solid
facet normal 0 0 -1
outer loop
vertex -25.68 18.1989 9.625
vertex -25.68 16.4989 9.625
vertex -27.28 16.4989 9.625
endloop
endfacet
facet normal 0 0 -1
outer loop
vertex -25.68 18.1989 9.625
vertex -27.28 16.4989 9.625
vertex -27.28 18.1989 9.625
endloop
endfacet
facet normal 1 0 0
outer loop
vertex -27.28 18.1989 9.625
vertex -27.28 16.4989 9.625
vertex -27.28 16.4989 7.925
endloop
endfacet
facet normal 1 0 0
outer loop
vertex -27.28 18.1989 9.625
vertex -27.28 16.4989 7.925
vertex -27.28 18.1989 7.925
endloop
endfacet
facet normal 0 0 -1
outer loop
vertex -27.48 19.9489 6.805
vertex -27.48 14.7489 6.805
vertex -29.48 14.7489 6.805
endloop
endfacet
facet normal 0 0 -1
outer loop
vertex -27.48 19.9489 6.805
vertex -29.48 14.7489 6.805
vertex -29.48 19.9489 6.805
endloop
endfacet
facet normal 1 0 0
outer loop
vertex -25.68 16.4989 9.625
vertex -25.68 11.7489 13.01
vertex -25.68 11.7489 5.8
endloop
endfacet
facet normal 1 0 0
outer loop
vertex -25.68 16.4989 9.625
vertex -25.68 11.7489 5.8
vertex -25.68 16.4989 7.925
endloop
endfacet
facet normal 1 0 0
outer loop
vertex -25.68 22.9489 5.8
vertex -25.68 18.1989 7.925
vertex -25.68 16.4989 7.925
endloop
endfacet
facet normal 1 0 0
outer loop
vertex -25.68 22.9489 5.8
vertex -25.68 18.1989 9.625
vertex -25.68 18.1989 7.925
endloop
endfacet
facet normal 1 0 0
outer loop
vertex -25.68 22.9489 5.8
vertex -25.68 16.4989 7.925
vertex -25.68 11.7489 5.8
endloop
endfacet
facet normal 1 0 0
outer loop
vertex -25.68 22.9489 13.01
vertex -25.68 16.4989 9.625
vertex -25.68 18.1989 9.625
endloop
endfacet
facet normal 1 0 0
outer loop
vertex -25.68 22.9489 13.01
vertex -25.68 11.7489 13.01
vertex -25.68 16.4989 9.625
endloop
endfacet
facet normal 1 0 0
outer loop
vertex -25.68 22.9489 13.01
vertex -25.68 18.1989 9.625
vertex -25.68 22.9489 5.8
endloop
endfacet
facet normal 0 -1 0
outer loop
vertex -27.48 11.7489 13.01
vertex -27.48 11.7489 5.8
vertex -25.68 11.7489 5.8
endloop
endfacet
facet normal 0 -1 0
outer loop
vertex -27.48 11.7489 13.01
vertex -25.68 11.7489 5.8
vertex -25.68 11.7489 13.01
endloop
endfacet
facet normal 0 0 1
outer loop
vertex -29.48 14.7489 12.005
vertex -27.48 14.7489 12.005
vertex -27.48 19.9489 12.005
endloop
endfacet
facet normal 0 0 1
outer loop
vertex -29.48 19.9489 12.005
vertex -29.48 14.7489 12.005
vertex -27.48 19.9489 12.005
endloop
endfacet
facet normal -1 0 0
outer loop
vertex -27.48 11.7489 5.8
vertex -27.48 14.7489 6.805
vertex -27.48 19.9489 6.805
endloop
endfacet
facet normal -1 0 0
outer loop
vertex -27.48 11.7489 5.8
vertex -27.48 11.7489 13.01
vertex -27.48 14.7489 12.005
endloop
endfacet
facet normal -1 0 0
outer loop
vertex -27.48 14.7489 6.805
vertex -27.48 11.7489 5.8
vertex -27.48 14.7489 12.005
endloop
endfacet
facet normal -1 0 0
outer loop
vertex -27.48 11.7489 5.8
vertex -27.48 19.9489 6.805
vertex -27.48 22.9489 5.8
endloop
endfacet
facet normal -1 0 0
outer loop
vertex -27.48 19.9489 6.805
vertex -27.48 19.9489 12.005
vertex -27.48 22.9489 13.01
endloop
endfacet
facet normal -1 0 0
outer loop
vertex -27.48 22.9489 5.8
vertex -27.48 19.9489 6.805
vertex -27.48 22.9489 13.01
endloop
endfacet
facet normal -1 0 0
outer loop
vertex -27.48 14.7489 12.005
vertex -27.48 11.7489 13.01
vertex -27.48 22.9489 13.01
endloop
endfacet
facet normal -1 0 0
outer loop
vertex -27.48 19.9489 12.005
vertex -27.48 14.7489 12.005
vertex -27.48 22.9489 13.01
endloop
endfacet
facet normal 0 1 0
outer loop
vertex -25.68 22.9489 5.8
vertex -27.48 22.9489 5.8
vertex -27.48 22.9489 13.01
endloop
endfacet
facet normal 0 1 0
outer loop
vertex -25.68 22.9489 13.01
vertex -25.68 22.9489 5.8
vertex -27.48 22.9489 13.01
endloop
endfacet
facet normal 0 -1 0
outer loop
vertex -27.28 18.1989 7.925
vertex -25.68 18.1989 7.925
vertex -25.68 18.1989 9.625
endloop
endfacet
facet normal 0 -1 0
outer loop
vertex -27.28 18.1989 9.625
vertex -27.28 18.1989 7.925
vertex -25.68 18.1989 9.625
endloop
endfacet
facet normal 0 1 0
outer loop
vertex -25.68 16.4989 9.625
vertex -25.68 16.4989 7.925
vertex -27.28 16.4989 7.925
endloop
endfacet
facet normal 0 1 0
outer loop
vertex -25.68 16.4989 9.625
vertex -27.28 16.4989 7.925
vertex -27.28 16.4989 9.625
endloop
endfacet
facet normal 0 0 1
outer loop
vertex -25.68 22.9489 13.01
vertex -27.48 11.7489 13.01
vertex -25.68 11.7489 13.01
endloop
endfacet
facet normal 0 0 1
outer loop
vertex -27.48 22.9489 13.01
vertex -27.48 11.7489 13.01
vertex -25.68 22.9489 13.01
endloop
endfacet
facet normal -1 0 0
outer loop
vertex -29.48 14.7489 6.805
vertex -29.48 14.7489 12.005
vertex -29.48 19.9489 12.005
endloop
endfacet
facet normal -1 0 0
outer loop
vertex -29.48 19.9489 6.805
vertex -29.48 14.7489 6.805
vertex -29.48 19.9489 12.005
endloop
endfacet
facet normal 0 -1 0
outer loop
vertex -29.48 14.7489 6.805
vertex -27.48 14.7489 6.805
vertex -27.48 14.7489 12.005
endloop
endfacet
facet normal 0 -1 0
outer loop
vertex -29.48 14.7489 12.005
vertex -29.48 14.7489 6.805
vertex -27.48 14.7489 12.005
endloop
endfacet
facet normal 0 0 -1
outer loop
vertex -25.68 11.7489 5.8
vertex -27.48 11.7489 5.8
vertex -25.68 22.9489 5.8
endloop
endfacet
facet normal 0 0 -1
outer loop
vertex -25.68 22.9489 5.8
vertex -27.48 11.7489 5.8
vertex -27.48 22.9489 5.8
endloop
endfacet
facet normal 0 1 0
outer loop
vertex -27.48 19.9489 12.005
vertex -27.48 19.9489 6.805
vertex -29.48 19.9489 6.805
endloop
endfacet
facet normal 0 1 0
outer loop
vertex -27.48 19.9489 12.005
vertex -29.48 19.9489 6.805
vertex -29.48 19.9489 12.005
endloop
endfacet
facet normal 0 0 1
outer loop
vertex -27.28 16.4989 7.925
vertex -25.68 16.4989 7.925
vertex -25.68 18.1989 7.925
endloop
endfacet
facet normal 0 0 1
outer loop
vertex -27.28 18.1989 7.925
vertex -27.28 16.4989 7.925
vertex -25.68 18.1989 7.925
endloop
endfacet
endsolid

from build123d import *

# Parameters (mm, degrees)
SKETCH132_W     = 11.2
SKETCH132_H     = 7.21
PAD065_DEPTH    = 1.8
SKETCH135_W     = 1.7
SKETCH135_H     = 1.7
POCKET058_DEPTH = 1.6
SKETCH136_W     = 5.2
SKETCH136_H     = 5.2
PAD066_DEPTH    = 2


with BuildPart() as part:
    # Sketch132 (on YZ_Plane of Origin) → Pad065 (new body)
    with BuildSketch(Plane.YZ):
        with Locations((17.348932, 9.405)):
            Rectangle(SKETCH132_W, SKETCH132_H)
    extrude(amount=PAD065_DEPTH)

    # Sketch135 (on YZ_Plane of Origin) → Pocket058 (cut)
    with BuildSketch(Plane.YZ.offset(1.8)):
        with Locations((17.348932, 8.775)):
            Rectangle(SKETCH135_W, SKETCH135_H)
    extrude(amount=-POCKET058_DEPTH, mode=Mode.SUBTRACT)

    # Sketch136 (on YZ_Plane of Origin) → Pad066 (join)
    with BuildSketch(Plane.YZ):
        with Locations((17.348932, 9.405)):
            Rectangle(SKETCH136_W, SKETCH136_H)
    extrude(amount=-PAD066_DEPTH)


with BuildPart() as part_1:
    # Body019 placement: moved
    add(part.part.moved(Location((-27.48, 0, 0))))


solid = part_1.part
